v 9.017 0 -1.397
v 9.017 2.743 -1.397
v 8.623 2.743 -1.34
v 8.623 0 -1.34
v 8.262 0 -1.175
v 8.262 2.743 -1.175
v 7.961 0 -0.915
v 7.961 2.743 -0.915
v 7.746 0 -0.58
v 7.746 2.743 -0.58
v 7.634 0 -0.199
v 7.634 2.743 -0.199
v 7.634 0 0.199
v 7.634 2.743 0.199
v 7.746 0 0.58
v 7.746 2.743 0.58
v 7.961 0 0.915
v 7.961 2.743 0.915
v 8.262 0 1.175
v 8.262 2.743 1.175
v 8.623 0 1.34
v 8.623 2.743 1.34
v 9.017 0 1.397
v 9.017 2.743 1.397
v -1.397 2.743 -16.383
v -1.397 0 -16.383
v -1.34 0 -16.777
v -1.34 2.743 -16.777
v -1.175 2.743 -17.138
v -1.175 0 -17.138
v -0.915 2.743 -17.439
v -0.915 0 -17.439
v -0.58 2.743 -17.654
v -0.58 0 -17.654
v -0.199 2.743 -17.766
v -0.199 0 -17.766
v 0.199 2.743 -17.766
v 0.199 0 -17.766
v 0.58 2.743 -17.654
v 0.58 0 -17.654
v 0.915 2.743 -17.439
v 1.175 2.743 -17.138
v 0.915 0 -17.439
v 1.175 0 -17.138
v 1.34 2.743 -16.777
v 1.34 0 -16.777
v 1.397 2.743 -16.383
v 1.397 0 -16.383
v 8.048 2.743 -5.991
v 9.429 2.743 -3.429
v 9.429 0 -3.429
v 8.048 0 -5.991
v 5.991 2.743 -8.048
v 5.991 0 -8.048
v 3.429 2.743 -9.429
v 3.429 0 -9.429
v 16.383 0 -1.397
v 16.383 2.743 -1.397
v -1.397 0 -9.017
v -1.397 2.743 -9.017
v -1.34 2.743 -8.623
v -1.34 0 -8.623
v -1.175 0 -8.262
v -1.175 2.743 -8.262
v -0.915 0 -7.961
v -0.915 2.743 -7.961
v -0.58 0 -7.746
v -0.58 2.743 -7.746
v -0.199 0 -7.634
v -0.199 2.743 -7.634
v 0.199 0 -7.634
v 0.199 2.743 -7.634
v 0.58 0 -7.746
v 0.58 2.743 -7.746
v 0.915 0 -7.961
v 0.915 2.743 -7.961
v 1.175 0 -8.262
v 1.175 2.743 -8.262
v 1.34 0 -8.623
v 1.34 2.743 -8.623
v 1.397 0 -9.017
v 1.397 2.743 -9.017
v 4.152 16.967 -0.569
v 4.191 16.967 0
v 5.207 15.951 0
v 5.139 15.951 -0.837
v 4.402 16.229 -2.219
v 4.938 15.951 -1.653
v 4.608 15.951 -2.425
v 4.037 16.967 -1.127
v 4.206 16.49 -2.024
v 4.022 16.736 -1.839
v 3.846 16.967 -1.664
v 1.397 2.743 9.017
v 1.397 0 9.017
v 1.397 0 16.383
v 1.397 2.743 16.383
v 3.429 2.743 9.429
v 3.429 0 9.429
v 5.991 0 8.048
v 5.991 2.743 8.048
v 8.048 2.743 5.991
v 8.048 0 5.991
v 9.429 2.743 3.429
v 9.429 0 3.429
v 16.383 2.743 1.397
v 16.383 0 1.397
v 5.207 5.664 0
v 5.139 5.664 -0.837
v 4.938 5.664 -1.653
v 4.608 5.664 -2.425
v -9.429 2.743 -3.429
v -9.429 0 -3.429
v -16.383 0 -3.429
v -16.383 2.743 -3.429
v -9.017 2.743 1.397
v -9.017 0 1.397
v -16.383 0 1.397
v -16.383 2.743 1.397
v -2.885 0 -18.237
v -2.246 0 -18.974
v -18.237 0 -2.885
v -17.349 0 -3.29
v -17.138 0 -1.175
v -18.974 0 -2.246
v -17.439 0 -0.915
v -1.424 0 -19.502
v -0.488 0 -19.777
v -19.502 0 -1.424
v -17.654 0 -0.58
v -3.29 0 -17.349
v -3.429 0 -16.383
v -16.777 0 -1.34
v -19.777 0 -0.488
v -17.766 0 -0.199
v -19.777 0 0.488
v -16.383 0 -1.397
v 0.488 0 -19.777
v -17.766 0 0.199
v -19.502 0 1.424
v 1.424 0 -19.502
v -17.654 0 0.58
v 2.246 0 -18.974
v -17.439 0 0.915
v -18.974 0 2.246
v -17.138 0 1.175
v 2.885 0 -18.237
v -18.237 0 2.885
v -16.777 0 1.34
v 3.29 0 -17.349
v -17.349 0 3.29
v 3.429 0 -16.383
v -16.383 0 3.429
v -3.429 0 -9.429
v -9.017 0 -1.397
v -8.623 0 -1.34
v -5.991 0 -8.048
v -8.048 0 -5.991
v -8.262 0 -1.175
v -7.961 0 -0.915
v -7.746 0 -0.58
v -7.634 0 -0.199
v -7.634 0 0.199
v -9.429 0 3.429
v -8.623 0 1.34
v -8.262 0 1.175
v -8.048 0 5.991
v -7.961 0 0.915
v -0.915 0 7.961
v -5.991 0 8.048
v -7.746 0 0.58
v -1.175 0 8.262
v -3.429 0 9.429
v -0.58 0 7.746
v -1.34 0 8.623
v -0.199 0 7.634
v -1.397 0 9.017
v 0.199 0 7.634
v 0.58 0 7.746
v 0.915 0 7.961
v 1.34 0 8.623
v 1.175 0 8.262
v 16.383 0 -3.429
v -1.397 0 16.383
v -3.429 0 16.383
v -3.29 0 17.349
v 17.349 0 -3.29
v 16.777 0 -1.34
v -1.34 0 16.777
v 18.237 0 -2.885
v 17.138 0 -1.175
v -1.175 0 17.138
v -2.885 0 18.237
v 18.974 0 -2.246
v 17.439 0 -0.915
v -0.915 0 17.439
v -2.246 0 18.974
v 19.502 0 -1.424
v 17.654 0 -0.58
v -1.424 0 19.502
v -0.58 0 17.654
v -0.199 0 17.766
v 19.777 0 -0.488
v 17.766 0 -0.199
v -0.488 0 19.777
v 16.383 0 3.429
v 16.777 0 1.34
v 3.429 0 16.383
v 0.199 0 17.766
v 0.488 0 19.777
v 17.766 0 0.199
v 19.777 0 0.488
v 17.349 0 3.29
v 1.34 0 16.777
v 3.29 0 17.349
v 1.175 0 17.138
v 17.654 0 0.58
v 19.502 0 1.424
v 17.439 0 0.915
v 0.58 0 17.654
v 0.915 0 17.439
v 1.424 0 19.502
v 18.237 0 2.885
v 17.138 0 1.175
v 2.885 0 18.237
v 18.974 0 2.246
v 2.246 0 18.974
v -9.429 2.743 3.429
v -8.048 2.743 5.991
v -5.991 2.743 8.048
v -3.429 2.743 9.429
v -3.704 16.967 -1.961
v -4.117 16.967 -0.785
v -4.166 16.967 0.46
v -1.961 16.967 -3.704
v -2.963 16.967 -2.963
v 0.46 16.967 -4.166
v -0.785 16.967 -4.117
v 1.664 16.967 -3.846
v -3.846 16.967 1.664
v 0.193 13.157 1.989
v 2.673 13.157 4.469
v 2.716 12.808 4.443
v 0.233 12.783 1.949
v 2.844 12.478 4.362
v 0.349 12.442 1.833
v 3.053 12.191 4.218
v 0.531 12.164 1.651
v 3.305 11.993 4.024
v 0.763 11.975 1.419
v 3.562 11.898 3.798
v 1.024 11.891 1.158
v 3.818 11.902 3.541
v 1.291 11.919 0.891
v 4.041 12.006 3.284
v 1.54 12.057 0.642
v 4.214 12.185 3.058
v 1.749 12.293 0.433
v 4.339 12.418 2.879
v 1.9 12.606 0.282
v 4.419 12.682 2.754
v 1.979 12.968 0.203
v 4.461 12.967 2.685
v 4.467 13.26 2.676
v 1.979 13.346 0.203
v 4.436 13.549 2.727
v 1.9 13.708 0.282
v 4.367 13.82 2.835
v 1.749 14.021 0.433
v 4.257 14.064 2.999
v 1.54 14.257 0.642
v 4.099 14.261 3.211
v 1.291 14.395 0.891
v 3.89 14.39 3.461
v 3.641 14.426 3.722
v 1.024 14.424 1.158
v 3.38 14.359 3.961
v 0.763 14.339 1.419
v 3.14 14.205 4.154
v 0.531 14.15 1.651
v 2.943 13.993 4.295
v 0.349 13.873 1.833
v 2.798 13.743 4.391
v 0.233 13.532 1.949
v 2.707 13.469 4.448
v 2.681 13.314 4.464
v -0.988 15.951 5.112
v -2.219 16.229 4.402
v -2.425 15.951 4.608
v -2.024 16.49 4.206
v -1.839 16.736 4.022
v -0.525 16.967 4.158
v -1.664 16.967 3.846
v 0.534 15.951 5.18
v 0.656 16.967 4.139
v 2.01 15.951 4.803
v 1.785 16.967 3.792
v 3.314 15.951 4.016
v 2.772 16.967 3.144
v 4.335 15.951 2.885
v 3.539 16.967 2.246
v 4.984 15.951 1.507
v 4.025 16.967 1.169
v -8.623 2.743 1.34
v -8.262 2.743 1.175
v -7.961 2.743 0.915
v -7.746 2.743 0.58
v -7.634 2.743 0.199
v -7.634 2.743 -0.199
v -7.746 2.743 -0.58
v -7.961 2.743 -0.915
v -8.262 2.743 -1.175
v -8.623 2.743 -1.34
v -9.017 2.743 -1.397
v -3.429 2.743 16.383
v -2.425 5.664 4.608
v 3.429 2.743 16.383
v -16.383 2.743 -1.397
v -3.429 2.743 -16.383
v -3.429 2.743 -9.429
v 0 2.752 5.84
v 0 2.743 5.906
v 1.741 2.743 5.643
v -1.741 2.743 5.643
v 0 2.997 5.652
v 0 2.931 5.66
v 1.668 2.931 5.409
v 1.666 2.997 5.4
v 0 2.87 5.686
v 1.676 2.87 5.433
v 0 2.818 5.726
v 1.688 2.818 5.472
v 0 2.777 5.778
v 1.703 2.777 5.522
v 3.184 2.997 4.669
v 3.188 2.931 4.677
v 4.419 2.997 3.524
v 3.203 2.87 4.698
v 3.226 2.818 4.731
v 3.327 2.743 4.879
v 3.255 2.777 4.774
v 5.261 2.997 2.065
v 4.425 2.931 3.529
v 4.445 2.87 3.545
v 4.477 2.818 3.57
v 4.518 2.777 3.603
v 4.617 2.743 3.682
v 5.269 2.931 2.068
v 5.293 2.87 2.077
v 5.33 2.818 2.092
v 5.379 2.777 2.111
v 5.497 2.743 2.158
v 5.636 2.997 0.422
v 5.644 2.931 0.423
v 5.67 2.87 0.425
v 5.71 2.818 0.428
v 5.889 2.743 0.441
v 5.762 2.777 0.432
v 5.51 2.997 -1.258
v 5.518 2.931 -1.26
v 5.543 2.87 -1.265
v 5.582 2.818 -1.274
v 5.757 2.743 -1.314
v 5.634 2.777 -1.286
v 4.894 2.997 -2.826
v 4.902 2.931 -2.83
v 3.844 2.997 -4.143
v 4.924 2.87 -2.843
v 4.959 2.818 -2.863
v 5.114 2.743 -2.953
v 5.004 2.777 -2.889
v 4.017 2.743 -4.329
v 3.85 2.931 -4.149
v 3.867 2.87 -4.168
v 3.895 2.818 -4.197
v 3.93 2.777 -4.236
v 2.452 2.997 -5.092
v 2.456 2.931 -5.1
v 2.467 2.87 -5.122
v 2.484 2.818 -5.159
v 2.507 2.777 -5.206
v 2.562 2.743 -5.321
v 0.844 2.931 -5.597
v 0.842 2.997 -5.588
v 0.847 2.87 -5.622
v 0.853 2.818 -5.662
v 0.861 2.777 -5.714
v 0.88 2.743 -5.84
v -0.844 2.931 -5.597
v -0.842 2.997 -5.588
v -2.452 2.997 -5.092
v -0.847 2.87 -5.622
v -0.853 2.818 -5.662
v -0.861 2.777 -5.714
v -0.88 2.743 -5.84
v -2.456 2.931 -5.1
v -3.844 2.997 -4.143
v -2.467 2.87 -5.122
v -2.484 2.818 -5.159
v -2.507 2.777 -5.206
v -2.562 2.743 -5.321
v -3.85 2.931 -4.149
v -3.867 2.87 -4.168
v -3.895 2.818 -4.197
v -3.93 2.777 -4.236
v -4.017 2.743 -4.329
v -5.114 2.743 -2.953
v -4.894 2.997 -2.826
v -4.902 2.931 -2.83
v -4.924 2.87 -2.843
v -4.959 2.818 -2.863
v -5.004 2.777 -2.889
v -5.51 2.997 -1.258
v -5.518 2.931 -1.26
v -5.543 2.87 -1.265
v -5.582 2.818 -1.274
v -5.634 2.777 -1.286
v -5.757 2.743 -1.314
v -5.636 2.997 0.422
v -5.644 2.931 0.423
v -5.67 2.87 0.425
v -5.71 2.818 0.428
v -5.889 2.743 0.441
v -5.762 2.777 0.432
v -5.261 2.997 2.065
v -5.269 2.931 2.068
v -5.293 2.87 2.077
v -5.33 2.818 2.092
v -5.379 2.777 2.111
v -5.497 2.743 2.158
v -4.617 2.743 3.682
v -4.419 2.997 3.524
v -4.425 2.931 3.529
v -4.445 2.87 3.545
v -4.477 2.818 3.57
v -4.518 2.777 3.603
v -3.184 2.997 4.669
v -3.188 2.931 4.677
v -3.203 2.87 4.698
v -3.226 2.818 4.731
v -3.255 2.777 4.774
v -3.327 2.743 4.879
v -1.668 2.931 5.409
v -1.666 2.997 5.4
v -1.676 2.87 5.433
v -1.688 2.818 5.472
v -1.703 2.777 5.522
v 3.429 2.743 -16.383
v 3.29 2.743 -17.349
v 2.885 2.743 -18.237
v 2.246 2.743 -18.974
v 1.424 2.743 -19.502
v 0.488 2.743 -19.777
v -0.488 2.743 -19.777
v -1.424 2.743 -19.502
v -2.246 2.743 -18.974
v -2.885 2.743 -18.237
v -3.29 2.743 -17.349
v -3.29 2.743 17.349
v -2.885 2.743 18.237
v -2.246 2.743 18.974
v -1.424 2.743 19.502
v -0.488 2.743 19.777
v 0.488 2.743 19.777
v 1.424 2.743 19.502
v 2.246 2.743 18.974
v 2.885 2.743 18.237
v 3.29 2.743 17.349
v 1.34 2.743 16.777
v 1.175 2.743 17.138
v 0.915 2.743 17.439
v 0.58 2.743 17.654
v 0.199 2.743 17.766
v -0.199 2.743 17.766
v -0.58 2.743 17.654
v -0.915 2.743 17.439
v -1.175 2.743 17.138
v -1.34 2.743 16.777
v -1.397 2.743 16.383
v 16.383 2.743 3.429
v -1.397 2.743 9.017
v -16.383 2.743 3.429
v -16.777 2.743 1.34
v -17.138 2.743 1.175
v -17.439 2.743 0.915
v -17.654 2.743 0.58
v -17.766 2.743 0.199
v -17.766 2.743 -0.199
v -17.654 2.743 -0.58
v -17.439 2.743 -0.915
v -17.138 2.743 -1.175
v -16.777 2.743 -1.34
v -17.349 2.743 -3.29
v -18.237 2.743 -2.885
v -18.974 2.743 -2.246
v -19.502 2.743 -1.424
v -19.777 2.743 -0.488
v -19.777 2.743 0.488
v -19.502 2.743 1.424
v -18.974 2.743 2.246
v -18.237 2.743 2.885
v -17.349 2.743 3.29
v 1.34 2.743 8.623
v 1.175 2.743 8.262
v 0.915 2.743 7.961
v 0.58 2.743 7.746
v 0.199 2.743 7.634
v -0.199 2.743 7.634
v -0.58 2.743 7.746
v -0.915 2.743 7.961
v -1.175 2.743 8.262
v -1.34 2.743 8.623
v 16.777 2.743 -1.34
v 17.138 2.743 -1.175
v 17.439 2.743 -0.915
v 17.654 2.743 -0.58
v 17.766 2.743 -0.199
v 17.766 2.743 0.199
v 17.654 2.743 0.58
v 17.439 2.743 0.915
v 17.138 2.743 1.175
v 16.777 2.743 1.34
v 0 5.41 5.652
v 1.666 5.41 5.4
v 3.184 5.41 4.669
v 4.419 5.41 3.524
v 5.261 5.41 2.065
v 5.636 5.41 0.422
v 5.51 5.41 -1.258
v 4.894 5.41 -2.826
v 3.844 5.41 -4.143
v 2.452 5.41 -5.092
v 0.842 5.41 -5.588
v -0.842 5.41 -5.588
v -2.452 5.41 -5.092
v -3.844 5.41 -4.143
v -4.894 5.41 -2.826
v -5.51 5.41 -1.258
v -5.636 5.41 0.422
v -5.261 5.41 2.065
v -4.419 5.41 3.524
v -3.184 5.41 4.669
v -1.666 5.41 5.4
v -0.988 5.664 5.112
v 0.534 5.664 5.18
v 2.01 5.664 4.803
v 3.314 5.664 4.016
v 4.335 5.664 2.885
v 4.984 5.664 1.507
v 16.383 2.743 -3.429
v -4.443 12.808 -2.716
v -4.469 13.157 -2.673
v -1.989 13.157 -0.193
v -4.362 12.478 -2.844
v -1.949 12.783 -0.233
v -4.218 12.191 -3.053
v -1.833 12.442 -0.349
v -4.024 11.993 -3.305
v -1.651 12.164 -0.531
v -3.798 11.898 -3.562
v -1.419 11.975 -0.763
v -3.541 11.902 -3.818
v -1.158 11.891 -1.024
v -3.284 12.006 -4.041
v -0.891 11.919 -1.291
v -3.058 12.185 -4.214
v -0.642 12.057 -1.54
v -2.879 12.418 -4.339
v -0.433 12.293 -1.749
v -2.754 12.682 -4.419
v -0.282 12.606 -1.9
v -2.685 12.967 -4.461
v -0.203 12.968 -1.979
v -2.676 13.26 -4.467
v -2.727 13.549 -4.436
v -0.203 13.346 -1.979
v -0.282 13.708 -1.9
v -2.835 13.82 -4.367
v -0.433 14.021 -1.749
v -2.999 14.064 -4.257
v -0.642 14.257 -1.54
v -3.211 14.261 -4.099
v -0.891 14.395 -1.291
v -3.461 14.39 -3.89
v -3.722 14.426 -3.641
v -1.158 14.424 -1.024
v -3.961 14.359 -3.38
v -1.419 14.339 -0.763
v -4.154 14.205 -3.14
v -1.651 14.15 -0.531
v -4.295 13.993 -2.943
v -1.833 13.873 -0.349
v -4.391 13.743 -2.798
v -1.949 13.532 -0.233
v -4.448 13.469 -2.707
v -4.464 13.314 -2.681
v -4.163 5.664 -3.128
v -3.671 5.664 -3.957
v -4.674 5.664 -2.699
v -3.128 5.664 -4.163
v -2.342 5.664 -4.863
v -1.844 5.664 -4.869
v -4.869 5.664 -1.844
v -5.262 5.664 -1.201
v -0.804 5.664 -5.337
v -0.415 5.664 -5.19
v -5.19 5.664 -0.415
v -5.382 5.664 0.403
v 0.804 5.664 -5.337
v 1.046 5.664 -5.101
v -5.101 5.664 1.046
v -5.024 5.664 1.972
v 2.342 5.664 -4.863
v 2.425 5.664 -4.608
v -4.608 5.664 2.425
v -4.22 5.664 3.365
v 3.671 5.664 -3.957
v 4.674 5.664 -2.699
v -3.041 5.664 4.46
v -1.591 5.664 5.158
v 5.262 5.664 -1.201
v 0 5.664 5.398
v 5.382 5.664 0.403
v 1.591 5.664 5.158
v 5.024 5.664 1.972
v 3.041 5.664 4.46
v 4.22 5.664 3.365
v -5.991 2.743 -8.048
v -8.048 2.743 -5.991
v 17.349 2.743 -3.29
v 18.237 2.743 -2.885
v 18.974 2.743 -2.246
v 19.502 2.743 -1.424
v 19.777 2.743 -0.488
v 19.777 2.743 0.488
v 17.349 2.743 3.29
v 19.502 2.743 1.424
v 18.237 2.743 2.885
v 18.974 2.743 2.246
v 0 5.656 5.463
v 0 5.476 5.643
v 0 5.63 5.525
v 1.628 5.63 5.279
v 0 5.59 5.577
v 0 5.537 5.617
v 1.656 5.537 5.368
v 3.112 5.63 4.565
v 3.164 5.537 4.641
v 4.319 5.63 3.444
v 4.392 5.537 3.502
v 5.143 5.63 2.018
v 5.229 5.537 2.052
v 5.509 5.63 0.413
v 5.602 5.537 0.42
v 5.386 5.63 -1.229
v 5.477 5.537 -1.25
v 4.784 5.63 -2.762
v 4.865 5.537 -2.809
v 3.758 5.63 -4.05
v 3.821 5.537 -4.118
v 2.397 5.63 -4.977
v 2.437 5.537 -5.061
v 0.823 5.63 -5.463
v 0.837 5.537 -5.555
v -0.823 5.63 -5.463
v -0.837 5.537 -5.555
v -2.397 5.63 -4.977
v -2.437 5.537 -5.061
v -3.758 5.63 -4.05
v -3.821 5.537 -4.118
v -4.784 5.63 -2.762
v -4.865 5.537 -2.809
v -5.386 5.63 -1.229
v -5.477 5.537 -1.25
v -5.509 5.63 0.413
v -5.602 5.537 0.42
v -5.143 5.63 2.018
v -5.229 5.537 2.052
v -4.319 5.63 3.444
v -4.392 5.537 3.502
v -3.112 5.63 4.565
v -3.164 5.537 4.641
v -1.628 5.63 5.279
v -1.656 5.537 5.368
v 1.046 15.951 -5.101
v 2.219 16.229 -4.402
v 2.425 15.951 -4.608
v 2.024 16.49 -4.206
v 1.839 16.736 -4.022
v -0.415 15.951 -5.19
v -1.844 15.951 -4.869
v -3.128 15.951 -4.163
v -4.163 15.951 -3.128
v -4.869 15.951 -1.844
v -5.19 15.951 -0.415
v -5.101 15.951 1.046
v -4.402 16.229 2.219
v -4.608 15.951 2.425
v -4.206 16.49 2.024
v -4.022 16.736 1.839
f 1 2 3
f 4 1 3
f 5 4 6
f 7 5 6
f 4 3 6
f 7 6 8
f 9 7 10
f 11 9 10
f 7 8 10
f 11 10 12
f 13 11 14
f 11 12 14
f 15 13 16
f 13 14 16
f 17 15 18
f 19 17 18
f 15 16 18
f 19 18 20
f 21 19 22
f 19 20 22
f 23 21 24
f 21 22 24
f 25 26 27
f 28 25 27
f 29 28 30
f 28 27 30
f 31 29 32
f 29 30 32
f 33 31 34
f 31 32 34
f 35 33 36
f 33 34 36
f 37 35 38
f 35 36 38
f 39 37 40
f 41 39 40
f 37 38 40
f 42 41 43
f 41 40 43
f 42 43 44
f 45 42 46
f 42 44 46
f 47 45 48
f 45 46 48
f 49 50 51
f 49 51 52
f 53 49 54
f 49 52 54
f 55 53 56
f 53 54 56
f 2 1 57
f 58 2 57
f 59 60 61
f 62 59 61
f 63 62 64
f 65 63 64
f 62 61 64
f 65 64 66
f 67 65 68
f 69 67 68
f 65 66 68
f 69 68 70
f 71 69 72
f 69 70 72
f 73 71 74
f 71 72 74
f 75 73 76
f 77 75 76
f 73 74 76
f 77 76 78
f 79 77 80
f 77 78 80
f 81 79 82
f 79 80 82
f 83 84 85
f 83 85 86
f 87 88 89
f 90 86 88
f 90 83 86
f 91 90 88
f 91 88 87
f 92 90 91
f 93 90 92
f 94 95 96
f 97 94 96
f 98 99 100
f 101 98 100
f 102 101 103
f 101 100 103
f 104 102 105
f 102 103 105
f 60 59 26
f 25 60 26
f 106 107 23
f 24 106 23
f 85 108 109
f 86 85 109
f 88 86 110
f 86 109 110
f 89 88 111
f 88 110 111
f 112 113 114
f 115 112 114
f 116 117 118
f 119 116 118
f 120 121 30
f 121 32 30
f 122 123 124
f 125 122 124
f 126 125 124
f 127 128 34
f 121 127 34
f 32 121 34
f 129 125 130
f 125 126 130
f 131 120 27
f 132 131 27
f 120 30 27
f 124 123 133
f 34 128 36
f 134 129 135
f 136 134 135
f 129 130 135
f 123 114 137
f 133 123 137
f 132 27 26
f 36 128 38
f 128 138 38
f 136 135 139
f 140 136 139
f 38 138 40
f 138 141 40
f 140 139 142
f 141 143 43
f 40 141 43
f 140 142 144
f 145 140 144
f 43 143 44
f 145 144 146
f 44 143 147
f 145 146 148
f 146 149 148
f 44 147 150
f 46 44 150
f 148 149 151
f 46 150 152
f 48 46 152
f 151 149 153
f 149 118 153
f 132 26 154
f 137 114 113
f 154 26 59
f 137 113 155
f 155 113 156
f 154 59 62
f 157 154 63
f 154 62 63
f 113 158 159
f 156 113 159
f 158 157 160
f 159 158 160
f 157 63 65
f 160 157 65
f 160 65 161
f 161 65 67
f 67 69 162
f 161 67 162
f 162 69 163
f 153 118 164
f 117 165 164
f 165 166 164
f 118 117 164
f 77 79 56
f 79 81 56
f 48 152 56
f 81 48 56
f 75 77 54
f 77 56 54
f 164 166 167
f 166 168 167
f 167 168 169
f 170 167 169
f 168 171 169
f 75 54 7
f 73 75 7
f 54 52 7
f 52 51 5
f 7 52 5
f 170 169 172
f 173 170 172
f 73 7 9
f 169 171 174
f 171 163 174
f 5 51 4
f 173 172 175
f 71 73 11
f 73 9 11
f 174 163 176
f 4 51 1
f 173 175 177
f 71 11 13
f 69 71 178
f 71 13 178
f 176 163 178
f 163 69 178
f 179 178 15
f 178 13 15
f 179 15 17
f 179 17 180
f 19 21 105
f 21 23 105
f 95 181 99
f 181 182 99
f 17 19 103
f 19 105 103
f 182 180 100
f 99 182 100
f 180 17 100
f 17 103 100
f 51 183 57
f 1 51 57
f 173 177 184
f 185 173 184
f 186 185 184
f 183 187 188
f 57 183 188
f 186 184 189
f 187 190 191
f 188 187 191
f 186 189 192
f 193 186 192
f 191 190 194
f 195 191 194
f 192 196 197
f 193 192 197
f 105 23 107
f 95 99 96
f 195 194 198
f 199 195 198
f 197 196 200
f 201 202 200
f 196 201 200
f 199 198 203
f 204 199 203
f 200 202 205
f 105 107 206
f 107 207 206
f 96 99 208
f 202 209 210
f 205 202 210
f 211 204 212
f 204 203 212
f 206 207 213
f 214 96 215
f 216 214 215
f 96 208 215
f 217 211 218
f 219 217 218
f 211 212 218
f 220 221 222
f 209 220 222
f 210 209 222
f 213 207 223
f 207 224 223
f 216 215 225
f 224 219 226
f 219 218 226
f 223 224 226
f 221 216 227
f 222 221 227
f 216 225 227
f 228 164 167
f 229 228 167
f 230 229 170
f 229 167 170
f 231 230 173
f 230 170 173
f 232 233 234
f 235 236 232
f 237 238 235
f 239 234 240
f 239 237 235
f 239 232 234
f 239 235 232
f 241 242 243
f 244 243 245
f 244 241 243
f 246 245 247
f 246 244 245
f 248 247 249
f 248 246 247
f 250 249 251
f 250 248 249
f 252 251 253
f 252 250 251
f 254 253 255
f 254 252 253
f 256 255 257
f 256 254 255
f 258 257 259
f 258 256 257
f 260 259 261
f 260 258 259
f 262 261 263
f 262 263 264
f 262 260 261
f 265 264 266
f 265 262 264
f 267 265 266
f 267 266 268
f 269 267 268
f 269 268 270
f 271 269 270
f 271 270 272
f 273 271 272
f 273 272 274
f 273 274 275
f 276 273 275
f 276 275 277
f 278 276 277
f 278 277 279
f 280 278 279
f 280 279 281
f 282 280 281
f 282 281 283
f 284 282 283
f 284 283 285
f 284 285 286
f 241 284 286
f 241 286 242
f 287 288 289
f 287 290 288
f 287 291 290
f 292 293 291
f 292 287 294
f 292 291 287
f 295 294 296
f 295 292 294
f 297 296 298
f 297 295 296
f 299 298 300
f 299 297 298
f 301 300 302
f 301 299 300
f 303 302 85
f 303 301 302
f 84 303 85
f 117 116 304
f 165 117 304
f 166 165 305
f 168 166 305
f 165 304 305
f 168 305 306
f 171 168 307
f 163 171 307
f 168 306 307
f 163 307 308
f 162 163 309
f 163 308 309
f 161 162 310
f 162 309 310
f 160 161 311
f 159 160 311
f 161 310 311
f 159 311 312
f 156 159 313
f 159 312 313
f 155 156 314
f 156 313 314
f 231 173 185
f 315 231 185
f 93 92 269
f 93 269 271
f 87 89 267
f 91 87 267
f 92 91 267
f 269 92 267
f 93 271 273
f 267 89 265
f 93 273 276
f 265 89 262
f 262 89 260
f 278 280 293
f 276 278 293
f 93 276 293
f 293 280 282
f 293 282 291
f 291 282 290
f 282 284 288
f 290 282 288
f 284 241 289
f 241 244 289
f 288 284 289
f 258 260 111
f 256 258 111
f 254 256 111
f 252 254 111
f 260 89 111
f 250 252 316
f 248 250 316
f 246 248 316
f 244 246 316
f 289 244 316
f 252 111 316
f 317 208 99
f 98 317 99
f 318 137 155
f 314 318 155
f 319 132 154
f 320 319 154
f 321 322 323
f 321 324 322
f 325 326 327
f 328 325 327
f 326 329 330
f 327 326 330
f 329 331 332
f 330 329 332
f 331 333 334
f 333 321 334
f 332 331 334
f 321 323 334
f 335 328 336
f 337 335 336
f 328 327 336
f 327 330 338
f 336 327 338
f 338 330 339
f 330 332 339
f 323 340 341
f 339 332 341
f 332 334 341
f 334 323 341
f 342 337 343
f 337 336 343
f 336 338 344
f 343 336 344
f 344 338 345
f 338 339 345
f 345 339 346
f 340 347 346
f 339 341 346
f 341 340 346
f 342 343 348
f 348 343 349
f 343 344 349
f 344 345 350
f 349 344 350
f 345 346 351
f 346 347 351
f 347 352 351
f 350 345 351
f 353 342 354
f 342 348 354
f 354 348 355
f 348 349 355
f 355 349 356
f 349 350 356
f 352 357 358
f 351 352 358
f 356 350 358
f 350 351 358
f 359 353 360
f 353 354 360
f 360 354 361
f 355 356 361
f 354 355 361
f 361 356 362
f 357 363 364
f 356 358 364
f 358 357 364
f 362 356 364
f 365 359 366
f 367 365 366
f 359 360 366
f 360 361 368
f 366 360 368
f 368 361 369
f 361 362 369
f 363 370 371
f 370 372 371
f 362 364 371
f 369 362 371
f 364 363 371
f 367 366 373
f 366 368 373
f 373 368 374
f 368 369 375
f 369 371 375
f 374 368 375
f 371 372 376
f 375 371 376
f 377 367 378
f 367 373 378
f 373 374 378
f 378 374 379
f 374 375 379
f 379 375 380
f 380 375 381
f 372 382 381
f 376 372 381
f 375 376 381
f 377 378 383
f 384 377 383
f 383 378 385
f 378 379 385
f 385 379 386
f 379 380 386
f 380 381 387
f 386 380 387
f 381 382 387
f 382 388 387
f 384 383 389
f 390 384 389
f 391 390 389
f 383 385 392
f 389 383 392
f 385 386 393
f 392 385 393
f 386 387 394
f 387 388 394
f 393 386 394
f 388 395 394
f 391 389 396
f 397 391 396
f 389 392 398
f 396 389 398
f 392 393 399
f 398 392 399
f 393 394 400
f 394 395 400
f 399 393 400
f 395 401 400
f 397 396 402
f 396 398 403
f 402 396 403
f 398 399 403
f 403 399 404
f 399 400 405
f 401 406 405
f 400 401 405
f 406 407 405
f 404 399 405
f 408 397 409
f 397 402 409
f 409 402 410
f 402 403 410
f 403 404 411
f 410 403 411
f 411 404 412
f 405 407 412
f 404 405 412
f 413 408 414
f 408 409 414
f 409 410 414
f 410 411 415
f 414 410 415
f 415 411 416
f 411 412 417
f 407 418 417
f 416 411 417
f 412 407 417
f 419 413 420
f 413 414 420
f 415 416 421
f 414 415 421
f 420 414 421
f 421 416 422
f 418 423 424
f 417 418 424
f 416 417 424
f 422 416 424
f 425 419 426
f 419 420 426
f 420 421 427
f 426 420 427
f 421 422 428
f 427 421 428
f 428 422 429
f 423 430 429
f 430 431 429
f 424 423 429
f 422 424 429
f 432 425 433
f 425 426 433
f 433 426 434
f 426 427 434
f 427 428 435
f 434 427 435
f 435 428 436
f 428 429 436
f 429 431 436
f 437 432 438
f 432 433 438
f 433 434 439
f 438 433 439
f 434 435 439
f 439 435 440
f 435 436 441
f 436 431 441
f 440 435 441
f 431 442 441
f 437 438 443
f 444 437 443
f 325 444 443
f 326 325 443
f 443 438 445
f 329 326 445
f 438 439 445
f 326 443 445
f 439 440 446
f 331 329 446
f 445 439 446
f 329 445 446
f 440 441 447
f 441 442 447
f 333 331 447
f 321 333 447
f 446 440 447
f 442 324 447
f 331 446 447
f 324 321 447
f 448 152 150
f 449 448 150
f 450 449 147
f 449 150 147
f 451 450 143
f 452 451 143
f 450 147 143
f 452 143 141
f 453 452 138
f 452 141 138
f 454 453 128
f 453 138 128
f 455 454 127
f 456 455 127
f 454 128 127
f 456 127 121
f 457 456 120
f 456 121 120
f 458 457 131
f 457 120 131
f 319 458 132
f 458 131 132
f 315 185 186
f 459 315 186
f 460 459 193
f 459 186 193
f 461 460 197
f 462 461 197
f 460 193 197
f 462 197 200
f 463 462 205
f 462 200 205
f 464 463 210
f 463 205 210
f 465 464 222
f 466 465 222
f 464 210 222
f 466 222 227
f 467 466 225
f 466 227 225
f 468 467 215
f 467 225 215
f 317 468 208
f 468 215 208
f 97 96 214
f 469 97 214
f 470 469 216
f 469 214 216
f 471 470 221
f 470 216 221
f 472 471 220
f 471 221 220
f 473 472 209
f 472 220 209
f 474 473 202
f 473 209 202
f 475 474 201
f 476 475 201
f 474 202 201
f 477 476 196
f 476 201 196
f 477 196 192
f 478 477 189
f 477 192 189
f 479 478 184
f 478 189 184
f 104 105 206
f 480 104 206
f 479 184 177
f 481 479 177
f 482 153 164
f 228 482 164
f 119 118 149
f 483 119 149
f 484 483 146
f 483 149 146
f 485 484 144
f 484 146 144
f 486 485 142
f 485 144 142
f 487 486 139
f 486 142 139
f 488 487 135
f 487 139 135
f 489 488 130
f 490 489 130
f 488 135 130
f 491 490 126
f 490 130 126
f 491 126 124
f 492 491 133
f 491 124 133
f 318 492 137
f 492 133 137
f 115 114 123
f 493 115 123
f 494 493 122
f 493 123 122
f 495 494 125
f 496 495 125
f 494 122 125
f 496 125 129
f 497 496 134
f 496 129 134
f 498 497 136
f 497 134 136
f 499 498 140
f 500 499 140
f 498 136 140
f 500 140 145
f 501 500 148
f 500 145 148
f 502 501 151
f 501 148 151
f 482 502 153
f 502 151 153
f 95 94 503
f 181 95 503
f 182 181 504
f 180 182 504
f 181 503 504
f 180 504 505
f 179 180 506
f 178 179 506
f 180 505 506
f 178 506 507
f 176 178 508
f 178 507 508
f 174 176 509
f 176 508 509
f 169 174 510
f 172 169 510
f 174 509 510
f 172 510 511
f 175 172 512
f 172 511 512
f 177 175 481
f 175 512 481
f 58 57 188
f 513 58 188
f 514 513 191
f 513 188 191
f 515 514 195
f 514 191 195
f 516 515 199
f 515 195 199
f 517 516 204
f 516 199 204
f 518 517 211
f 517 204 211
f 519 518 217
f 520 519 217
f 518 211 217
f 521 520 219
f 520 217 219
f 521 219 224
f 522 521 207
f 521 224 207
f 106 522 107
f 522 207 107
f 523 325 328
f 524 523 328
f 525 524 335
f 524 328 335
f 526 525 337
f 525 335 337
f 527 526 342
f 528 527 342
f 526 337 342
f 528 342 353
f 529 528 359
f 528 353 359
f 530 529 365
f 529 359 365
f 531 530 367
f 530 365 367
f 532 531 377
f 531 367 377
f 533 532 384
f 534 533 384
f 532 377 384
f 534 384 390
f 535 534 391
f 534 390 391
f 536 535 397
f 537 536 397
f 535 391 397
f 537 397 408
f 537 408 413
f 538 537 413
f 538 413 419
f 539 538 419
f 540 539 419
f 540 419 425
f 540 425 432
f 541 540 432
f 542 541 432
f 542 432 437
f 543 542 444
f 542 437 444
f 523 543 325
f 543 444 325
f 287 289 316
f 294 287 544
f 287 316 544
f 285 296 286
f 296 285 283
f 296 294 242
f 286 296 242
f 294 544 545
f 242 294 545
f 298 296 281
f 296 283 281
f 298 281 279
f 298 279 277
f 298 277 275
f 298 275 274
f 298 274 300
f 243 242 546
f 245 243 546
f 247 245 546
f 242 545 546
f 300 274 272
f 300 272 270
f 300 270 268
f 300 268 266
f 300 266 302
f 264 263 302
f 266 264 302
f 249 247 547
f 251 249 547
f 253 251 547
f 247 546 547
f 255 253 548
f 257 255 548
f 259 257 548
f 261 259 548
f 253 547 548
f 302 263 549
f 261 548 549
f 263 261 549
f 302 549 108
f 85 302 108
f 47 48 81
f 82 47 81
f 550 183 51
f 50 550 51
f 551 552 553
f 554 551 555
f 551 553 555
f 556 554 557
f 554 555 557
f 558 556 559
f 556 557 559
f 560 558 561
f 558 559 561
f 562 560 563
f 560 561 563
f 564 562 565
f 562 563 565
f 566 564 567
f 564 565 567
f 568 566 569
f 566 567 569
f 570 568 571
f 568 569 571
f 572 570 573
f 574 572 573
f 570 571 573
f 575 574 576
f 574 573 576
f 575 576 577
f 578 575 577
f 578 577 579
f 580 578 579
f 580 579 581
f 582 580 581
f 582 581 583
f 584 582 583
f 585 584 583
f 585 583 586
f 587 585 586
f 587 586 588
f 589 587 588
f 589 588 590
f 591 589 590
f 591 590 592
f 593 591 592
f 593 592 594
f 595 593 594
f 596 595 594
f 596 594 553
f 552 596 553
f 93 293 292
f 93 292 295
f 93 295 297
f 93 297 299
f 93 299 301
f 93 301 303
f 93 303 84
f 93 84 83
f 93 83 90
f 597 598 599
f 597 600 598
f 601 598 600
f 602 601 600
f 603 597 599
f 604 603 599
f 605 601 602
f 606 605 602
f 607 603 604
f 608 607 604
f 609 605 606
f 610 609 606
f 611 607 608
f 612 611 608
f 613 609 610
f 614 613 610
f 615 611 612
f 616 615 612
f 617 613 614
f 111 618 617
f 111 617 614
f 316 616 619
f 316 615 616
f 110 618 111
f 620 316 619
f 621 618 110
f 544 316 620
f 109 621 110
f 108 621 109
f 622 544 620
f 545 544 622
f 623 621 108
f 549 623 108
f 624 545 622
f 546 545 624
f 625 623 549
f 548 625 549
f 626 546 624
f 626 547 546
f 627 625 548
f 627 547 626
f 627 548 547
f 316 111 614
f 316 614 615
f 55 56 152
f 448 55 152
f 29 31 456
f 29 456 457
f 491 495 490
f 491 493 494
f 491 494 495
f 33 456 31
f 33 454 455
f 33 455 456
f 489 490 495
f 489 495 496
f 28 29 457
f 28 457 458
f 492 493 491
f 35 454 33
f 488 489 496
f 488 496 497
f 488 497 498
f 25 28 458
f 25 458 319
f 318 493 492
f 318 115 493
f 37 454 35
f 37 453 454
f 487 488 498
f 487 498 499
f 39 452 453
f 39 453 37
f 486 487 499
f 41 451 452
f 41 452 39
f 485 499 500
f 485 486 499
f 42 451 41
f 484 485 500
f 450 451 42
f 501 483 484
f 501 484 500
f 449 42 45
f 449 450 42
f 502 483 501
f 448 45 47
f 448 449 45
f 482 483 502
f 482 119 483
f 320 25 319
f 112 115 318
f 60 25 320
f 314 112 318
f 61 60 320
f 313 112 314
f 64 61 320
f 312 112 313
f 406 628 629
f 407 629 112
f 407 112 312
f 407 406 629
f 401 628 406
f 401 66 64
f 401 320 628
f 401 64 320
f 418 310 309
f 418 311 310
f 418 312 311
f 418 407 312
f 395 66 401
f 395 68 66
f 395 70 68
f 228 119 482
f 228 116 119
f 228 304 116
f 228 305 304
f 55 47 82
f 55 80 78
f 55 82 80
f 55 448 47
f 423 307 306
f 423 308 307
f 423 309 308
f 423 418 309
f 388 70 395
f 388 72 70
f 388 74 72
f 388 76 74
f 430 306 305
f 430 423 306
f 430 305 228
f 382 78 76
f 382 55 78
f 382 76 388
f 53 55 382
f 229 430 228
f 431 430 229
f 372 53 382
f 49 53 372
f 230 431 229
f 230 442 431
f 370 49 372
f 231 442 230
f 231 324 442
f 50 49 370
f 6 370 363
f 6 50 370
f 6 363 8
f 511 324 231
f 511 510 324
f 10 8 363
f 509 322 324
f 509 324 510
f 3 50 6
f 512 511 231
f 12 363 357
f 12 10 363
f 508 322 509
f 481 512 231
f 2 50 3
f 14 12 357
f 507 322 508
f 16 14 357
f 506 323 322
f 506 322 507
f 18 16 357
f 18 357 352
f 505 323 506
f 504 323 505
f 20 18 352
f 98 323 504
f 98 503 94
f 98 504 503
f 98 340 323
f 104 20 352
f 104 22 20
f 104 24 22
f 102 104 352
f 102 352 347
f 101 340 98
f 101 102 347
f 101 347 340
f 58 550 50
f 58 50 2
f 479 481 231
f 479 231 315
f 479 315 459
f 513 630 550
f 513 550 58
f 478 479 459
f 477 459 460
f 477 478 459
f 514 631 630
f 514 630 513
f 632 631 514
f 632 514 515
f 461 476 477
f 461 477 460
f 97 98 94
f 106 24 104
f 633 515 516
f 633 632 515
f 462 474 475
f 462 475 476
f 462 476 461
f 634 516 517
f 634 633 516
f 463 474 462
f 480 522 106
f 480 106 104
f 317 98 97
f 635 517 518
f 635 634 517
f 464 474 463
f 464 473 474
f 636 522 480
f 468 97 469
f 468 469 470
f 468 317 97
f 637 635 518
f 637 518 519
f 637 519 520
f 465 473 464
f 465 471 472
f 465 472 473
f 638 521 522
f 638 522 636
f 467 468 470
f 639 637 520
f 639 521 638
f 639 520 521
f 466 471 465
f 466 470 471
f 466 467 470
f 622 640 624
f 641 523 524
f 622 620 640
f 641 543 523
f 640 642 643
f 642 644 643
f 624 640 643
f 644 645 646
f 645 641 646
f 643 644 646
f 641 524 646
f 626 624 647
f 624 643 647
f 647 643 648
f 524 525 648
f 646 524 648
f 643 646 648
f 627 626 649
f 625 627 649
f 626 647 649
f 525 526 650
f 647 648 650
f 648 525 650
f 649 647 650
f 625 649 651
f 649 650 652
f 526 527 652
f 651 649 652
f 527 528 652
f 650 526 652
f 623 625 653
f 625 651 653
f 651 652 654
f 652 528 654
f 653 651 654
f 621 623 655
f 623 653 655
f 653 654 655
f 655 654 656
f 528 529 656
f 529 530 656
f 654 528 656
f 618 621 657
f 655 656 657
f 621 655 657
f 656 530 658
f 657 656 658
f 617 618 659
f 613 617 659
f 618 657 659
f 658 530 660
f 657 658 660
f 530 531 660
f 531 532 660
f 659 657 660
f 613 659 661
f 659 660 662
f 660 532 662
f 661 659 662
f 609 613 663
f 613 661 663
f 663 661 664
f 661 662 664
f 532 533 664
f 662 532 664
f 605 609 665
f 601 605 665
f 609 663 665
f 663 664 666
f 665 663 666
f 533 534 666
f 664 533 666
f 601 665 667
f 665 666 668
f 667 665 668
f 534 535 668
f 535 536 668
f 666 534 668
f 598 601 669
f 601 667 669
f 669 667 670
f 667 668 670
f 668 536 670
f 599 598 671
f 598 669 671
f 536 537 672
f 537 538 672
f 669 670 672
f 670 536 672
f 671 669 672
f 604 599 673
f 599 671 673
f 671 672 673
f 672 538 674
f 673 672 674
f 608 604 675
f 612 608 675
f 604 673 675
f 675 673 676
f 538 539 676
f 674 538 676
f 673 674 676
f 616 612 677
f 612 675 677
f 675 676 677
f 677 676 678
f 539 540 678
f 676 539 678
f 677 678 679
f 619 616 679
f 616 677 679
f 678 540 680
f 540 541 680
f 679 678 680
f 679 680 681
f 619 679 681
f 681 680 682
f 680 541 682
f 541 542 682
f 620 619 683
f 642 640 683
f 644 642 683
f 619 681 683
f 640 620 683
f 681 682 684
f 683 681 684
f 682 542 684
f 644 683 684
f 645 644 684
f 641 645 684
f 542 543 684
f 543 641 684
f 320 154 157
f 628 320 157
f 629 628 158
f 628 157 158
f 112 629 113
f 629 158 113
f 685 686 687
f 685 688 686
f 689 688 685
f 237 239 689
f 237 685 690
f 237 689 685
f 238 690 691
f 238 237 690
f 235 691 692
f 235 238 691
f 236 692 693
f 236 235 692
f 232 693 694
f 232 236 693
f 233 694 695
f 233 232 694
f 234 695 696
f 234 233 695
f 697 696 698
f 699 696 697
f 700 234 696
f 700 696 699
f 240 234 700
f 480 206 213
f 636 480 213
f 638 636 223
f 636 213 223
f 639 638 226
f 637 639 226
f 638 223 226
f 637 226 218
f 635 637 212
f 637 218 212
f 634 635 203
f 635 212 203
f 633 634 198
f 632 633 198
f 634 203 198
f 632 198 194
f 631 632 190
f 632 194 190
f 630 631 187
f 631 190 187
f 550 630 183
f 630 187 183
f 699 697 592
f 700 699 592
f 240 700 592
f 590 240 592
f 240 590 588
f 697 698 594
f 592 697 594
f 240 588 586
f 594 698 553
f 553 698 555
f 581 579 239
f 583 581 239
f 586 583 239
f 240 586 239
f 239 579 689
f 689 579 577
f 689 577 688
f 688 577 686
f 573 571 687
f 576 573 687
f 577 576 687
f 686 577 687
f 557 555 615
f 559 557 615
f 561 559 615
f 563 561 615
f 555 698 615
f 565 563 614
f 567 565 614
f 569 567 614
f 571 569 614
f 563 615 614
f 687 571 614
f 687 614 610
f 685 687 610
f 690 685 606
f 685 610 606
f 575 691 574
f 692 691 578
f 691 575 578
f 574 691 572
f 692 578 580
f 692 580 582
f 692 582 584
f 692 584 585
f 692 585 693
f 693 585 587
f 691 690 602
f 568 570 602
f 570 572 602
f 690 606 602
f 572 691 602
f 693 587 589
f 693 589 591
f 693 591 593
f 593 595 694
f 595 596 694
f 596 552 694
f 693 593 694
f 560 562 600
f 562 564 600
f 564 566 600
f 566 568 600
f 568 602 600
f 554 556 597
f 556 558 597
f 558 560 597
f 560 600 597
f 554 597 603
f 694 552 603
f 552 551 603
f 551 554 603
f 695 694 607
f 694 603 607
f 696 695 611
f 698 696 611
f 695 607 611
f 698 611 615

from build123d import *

# Parameters (mm, degrees)
SKETCH3_R                      = 10.033
BOSS_EXTRUDE1_DEPTH            = 2.7432
BOSS_EXTRUDE2_START            = -2.7432
BOSS_EXTRUDE2_DEPTH            = 2.7432
CUT_EXTRUDE1_REACH             = 24.376
CIRPATTERN1_COUNT              = 4
SKETCH5_R                      = 5.6515
BOSS_EXTRUDE3_DEPTH            = 2.921
BOSS_EXTRUDE4_DEPTH            = 11.303
CHAMFER1_SIZE                  = 1.016
FILLET1_R                      = 0.254
CUT_EXTRUDE2_REACH             = 36.085
SKETCH7_R                      = 1.27
CUT_EXTRUDE2_DIRECTION_2_REACH = 36.085


with BuildPart() as part:
    # Sketch3 → Boss-Extrude1 (new body)
    with BuildSketch(Plane(origin=(0, 0, 0), x_dir=(1, 0, 0), z_dir=(0, 1, 0))):
        with Locations(Location((0, 0, 0), (0, 0, 270))):
            Circle(SKETCH3_R)
    extrude(amount=BOSS_EXTRUDE1_DEPTH)

    # Sketch4 → Boss-Extrude2 (add)
    with BuildSketch(Plane(origin=(0, 2.7432, 0), x_dir=(1, 0, 0), z_dir=(0, 1, 0)).offset(BOSS_EXTRUDE2_START)):
        with BuildLine():
            ThreePointArc((9.428841286, 3.429), (9.73521463, 2.426249185), (9.935264466, 1.397))
            Line((9.935264466, 1.397), (16.383, 1.397))
            ThreePointArc((16.383, 1.397), (17.78, 0), (16.383, -1.397))
            Line((16.383, -1.397), (9.935264466, -1.397))
            ThreePointArc((9.935264466, -1.397), (9.73521463, -2.426249185), (9.428841286, -3.429))
            Line((9.428841286, -3.429), (16.383, -3.429))
            ThreePointArc((16.383, -3.429), (19.812, 0), (16.383, 3.429))
            Line((16.383, 3.429), (9.428841286, 3.429))
        make_face()
    boss_extrude2 = extrude(amount=BOSS_EXTRUDE2_DEPTH)

    # Sketch4<3> → Cut-Extrude1 (cut, up to next)
    with BuildSketch(Plane(origin=(0, 2.7432, 0), x_dir=(1, 0, 0), z_dir=(0, 1, 0)), mode=Mode.PRIVATE) as cut_extrude1_sk1:
        with BuildLine():
            Line((9.935264466, 1.397), (9.017, 1.397))
            ThreePointArc((9.017, 1.397), (7.62, 0), (9.017, -1.397))
            Line((9.017, -1.397), (9.935264466, -1.397))
            ThreePointArc((9.935264466, -1.397), (10.008536291, -0.700207333), (10.033, 0))
            ThreePointArc((10.033, 0), (10.008536291, 0.700207333), (9.935264466, 1.397))
        make_face()
    cut_extrude1_tool1 = extrude(cut_extrude1_sk1.sketch, amount=-CUT_EXTRUDE1_REACH, mode=Mode.PRIVATE) & part.part
    cut_extrude1 = cut_extrude1_tool1.solids().sort_by_distance((8.936983, 2.7432, 0))[0]
    add(cut_extrude1, mode=Mode.SUBTRACT)

    # CirPattern1: Boss-Extrude2, Cut-Extrude1 ×4 about axis
    cirpattern1_axis = Axis((0, 0, 0), (0, 1, 0))
    add([boss_extrude2.rotate(cirpattern1_axis, i * 360 / CIRPATTERN1_COUNT) for i in range(1, CIRPATTERN1_COUNT)])
    add([cut_extrude1.rotate(cirpattern1_axis, i * 360 / CIRPATTERN1_COUNT) for i in range(1, CIRPATTERN1_COUNT)], mode=Mode.SUBTRACT)

    # Sketch5 → Boss-Extrude3 (add)
    with BuildSketch(Plane(origin=(0, 2.7432, 0), x_dir=(1, 0, 0), z_dir=(0, 1, 0))):
        with Locations(Location((0, 0, 0), (0, 0, 270))):
            Circle(SKETCH5_R)
    extrude(amount=BOSS_EXTRUDE3_DEPTH)

    # Sketch6 → Boss-Extrude4 (add)
    with BuildSketch(Plane(origin=(0, 5.6642, 0), x_dir=(1, 0, 0), z_dir=(0, 1, 0))):
        with BuildLine():
            ThreePointArc((5.207, 0), (5.054935189, 1.249191434), (4.607622532, 2.425420294))
            Line((4.607622532, 2.425420294), (-2.425420294, -4.607622532))
            ThreePointArc((-2.425420294, -4.607622532), (2.691067216, -4.457690684), (5.207, 0))
        make_face()
        with BuildLine():
            Line((-4.607622532, -2.425420294), (2.425420294, 4.607622532))
            ThreePointArc((2.425420294, 4.607622532), (-3.68190501, 3.68190501), (-4.607622532, -2.425420294))
        make_face()
    extrude(amount=BOSS_EXTRUDE4_DEPTH)

    # Chamfer1
    chamfer1_edges = [part.edges().sort_by_distance(p)[0] for p in [
        (3.68190501, 16.9672, 3.68190501),
        (-3.68190501, 16.9672, -3.68190501),
    ]]
    chamfer(chamfer1_edges, length=CHAMFER1_SIZE)

    # Fillet1
    fillet1_edges = [part.edges().sort_by_distance(p)[0] for p in [
        (0, 2.7432, -5.6515),
        (0, 5.6642, -5.6515),
    ]]
    fillet(fillet1_edges, radius=FILLET1_R)

    # Sketch7 → Cut-Extrude2 (cut, up to next)
    with BuildSketch(Plane(origin=(-1.091101119, 0, -1.091101119), x_dir=(0.7071067811865486, 0, -0.7071067811865465), z_dir=(0.7071067811865465, 0, 0.7071067811865486)), mode=Mode.PRIVATE) as cut_extrude2_sk1:
        with Locations(Location((0, 13.1572, 0), (0, 0, 180))):
            Circle(SKETCH7_R)
    cut_extrude2_tool1 = extrude(cut_extrude2_sk1.sketch, amount=-CUT_EXTRUDE2_REACH, mode=Mode.PRIVATE) & part.part
    add(cut_extrude2_tool1.solids().sort_by_distance((-1.091101, 13.1572, -1.091101))[0], mode=Mode.SUBTRACT)

    # Sketch7 → Cut-Extrude2 direction 2 (cut, up to next)
    with BuildSketch(Plane(origin=(-1.091101119, 0, -1.091101119), x_dir=(0.7071067811865486, 0, -0.7071067811865465), z_dir=(0.7071067811865465, 0, 0.7071067811865486)), mode=Mode.PRIVATE) as cut_extrude2_direction_2_sk1:
        with Locations(Location((0, 13.1572, 0), (0, 0, 180))):
            Circle(SKETCH7_R)
    cut_extrude2_direction_2_tool1 = extrude(cut_extrude2_direction_2_sk1.sketch, amount=CUT_EXTRUDE2_DIRECTION_2_REACH, mode=Mode.PRIVATE) & part.part
    add(cut_extrude2_direction_2_tool1.solids().sort_by_distance((-1.091101, 13.1572, -1.091101))[0], mode=Mode.SUBTRACT)


solid = part.part
